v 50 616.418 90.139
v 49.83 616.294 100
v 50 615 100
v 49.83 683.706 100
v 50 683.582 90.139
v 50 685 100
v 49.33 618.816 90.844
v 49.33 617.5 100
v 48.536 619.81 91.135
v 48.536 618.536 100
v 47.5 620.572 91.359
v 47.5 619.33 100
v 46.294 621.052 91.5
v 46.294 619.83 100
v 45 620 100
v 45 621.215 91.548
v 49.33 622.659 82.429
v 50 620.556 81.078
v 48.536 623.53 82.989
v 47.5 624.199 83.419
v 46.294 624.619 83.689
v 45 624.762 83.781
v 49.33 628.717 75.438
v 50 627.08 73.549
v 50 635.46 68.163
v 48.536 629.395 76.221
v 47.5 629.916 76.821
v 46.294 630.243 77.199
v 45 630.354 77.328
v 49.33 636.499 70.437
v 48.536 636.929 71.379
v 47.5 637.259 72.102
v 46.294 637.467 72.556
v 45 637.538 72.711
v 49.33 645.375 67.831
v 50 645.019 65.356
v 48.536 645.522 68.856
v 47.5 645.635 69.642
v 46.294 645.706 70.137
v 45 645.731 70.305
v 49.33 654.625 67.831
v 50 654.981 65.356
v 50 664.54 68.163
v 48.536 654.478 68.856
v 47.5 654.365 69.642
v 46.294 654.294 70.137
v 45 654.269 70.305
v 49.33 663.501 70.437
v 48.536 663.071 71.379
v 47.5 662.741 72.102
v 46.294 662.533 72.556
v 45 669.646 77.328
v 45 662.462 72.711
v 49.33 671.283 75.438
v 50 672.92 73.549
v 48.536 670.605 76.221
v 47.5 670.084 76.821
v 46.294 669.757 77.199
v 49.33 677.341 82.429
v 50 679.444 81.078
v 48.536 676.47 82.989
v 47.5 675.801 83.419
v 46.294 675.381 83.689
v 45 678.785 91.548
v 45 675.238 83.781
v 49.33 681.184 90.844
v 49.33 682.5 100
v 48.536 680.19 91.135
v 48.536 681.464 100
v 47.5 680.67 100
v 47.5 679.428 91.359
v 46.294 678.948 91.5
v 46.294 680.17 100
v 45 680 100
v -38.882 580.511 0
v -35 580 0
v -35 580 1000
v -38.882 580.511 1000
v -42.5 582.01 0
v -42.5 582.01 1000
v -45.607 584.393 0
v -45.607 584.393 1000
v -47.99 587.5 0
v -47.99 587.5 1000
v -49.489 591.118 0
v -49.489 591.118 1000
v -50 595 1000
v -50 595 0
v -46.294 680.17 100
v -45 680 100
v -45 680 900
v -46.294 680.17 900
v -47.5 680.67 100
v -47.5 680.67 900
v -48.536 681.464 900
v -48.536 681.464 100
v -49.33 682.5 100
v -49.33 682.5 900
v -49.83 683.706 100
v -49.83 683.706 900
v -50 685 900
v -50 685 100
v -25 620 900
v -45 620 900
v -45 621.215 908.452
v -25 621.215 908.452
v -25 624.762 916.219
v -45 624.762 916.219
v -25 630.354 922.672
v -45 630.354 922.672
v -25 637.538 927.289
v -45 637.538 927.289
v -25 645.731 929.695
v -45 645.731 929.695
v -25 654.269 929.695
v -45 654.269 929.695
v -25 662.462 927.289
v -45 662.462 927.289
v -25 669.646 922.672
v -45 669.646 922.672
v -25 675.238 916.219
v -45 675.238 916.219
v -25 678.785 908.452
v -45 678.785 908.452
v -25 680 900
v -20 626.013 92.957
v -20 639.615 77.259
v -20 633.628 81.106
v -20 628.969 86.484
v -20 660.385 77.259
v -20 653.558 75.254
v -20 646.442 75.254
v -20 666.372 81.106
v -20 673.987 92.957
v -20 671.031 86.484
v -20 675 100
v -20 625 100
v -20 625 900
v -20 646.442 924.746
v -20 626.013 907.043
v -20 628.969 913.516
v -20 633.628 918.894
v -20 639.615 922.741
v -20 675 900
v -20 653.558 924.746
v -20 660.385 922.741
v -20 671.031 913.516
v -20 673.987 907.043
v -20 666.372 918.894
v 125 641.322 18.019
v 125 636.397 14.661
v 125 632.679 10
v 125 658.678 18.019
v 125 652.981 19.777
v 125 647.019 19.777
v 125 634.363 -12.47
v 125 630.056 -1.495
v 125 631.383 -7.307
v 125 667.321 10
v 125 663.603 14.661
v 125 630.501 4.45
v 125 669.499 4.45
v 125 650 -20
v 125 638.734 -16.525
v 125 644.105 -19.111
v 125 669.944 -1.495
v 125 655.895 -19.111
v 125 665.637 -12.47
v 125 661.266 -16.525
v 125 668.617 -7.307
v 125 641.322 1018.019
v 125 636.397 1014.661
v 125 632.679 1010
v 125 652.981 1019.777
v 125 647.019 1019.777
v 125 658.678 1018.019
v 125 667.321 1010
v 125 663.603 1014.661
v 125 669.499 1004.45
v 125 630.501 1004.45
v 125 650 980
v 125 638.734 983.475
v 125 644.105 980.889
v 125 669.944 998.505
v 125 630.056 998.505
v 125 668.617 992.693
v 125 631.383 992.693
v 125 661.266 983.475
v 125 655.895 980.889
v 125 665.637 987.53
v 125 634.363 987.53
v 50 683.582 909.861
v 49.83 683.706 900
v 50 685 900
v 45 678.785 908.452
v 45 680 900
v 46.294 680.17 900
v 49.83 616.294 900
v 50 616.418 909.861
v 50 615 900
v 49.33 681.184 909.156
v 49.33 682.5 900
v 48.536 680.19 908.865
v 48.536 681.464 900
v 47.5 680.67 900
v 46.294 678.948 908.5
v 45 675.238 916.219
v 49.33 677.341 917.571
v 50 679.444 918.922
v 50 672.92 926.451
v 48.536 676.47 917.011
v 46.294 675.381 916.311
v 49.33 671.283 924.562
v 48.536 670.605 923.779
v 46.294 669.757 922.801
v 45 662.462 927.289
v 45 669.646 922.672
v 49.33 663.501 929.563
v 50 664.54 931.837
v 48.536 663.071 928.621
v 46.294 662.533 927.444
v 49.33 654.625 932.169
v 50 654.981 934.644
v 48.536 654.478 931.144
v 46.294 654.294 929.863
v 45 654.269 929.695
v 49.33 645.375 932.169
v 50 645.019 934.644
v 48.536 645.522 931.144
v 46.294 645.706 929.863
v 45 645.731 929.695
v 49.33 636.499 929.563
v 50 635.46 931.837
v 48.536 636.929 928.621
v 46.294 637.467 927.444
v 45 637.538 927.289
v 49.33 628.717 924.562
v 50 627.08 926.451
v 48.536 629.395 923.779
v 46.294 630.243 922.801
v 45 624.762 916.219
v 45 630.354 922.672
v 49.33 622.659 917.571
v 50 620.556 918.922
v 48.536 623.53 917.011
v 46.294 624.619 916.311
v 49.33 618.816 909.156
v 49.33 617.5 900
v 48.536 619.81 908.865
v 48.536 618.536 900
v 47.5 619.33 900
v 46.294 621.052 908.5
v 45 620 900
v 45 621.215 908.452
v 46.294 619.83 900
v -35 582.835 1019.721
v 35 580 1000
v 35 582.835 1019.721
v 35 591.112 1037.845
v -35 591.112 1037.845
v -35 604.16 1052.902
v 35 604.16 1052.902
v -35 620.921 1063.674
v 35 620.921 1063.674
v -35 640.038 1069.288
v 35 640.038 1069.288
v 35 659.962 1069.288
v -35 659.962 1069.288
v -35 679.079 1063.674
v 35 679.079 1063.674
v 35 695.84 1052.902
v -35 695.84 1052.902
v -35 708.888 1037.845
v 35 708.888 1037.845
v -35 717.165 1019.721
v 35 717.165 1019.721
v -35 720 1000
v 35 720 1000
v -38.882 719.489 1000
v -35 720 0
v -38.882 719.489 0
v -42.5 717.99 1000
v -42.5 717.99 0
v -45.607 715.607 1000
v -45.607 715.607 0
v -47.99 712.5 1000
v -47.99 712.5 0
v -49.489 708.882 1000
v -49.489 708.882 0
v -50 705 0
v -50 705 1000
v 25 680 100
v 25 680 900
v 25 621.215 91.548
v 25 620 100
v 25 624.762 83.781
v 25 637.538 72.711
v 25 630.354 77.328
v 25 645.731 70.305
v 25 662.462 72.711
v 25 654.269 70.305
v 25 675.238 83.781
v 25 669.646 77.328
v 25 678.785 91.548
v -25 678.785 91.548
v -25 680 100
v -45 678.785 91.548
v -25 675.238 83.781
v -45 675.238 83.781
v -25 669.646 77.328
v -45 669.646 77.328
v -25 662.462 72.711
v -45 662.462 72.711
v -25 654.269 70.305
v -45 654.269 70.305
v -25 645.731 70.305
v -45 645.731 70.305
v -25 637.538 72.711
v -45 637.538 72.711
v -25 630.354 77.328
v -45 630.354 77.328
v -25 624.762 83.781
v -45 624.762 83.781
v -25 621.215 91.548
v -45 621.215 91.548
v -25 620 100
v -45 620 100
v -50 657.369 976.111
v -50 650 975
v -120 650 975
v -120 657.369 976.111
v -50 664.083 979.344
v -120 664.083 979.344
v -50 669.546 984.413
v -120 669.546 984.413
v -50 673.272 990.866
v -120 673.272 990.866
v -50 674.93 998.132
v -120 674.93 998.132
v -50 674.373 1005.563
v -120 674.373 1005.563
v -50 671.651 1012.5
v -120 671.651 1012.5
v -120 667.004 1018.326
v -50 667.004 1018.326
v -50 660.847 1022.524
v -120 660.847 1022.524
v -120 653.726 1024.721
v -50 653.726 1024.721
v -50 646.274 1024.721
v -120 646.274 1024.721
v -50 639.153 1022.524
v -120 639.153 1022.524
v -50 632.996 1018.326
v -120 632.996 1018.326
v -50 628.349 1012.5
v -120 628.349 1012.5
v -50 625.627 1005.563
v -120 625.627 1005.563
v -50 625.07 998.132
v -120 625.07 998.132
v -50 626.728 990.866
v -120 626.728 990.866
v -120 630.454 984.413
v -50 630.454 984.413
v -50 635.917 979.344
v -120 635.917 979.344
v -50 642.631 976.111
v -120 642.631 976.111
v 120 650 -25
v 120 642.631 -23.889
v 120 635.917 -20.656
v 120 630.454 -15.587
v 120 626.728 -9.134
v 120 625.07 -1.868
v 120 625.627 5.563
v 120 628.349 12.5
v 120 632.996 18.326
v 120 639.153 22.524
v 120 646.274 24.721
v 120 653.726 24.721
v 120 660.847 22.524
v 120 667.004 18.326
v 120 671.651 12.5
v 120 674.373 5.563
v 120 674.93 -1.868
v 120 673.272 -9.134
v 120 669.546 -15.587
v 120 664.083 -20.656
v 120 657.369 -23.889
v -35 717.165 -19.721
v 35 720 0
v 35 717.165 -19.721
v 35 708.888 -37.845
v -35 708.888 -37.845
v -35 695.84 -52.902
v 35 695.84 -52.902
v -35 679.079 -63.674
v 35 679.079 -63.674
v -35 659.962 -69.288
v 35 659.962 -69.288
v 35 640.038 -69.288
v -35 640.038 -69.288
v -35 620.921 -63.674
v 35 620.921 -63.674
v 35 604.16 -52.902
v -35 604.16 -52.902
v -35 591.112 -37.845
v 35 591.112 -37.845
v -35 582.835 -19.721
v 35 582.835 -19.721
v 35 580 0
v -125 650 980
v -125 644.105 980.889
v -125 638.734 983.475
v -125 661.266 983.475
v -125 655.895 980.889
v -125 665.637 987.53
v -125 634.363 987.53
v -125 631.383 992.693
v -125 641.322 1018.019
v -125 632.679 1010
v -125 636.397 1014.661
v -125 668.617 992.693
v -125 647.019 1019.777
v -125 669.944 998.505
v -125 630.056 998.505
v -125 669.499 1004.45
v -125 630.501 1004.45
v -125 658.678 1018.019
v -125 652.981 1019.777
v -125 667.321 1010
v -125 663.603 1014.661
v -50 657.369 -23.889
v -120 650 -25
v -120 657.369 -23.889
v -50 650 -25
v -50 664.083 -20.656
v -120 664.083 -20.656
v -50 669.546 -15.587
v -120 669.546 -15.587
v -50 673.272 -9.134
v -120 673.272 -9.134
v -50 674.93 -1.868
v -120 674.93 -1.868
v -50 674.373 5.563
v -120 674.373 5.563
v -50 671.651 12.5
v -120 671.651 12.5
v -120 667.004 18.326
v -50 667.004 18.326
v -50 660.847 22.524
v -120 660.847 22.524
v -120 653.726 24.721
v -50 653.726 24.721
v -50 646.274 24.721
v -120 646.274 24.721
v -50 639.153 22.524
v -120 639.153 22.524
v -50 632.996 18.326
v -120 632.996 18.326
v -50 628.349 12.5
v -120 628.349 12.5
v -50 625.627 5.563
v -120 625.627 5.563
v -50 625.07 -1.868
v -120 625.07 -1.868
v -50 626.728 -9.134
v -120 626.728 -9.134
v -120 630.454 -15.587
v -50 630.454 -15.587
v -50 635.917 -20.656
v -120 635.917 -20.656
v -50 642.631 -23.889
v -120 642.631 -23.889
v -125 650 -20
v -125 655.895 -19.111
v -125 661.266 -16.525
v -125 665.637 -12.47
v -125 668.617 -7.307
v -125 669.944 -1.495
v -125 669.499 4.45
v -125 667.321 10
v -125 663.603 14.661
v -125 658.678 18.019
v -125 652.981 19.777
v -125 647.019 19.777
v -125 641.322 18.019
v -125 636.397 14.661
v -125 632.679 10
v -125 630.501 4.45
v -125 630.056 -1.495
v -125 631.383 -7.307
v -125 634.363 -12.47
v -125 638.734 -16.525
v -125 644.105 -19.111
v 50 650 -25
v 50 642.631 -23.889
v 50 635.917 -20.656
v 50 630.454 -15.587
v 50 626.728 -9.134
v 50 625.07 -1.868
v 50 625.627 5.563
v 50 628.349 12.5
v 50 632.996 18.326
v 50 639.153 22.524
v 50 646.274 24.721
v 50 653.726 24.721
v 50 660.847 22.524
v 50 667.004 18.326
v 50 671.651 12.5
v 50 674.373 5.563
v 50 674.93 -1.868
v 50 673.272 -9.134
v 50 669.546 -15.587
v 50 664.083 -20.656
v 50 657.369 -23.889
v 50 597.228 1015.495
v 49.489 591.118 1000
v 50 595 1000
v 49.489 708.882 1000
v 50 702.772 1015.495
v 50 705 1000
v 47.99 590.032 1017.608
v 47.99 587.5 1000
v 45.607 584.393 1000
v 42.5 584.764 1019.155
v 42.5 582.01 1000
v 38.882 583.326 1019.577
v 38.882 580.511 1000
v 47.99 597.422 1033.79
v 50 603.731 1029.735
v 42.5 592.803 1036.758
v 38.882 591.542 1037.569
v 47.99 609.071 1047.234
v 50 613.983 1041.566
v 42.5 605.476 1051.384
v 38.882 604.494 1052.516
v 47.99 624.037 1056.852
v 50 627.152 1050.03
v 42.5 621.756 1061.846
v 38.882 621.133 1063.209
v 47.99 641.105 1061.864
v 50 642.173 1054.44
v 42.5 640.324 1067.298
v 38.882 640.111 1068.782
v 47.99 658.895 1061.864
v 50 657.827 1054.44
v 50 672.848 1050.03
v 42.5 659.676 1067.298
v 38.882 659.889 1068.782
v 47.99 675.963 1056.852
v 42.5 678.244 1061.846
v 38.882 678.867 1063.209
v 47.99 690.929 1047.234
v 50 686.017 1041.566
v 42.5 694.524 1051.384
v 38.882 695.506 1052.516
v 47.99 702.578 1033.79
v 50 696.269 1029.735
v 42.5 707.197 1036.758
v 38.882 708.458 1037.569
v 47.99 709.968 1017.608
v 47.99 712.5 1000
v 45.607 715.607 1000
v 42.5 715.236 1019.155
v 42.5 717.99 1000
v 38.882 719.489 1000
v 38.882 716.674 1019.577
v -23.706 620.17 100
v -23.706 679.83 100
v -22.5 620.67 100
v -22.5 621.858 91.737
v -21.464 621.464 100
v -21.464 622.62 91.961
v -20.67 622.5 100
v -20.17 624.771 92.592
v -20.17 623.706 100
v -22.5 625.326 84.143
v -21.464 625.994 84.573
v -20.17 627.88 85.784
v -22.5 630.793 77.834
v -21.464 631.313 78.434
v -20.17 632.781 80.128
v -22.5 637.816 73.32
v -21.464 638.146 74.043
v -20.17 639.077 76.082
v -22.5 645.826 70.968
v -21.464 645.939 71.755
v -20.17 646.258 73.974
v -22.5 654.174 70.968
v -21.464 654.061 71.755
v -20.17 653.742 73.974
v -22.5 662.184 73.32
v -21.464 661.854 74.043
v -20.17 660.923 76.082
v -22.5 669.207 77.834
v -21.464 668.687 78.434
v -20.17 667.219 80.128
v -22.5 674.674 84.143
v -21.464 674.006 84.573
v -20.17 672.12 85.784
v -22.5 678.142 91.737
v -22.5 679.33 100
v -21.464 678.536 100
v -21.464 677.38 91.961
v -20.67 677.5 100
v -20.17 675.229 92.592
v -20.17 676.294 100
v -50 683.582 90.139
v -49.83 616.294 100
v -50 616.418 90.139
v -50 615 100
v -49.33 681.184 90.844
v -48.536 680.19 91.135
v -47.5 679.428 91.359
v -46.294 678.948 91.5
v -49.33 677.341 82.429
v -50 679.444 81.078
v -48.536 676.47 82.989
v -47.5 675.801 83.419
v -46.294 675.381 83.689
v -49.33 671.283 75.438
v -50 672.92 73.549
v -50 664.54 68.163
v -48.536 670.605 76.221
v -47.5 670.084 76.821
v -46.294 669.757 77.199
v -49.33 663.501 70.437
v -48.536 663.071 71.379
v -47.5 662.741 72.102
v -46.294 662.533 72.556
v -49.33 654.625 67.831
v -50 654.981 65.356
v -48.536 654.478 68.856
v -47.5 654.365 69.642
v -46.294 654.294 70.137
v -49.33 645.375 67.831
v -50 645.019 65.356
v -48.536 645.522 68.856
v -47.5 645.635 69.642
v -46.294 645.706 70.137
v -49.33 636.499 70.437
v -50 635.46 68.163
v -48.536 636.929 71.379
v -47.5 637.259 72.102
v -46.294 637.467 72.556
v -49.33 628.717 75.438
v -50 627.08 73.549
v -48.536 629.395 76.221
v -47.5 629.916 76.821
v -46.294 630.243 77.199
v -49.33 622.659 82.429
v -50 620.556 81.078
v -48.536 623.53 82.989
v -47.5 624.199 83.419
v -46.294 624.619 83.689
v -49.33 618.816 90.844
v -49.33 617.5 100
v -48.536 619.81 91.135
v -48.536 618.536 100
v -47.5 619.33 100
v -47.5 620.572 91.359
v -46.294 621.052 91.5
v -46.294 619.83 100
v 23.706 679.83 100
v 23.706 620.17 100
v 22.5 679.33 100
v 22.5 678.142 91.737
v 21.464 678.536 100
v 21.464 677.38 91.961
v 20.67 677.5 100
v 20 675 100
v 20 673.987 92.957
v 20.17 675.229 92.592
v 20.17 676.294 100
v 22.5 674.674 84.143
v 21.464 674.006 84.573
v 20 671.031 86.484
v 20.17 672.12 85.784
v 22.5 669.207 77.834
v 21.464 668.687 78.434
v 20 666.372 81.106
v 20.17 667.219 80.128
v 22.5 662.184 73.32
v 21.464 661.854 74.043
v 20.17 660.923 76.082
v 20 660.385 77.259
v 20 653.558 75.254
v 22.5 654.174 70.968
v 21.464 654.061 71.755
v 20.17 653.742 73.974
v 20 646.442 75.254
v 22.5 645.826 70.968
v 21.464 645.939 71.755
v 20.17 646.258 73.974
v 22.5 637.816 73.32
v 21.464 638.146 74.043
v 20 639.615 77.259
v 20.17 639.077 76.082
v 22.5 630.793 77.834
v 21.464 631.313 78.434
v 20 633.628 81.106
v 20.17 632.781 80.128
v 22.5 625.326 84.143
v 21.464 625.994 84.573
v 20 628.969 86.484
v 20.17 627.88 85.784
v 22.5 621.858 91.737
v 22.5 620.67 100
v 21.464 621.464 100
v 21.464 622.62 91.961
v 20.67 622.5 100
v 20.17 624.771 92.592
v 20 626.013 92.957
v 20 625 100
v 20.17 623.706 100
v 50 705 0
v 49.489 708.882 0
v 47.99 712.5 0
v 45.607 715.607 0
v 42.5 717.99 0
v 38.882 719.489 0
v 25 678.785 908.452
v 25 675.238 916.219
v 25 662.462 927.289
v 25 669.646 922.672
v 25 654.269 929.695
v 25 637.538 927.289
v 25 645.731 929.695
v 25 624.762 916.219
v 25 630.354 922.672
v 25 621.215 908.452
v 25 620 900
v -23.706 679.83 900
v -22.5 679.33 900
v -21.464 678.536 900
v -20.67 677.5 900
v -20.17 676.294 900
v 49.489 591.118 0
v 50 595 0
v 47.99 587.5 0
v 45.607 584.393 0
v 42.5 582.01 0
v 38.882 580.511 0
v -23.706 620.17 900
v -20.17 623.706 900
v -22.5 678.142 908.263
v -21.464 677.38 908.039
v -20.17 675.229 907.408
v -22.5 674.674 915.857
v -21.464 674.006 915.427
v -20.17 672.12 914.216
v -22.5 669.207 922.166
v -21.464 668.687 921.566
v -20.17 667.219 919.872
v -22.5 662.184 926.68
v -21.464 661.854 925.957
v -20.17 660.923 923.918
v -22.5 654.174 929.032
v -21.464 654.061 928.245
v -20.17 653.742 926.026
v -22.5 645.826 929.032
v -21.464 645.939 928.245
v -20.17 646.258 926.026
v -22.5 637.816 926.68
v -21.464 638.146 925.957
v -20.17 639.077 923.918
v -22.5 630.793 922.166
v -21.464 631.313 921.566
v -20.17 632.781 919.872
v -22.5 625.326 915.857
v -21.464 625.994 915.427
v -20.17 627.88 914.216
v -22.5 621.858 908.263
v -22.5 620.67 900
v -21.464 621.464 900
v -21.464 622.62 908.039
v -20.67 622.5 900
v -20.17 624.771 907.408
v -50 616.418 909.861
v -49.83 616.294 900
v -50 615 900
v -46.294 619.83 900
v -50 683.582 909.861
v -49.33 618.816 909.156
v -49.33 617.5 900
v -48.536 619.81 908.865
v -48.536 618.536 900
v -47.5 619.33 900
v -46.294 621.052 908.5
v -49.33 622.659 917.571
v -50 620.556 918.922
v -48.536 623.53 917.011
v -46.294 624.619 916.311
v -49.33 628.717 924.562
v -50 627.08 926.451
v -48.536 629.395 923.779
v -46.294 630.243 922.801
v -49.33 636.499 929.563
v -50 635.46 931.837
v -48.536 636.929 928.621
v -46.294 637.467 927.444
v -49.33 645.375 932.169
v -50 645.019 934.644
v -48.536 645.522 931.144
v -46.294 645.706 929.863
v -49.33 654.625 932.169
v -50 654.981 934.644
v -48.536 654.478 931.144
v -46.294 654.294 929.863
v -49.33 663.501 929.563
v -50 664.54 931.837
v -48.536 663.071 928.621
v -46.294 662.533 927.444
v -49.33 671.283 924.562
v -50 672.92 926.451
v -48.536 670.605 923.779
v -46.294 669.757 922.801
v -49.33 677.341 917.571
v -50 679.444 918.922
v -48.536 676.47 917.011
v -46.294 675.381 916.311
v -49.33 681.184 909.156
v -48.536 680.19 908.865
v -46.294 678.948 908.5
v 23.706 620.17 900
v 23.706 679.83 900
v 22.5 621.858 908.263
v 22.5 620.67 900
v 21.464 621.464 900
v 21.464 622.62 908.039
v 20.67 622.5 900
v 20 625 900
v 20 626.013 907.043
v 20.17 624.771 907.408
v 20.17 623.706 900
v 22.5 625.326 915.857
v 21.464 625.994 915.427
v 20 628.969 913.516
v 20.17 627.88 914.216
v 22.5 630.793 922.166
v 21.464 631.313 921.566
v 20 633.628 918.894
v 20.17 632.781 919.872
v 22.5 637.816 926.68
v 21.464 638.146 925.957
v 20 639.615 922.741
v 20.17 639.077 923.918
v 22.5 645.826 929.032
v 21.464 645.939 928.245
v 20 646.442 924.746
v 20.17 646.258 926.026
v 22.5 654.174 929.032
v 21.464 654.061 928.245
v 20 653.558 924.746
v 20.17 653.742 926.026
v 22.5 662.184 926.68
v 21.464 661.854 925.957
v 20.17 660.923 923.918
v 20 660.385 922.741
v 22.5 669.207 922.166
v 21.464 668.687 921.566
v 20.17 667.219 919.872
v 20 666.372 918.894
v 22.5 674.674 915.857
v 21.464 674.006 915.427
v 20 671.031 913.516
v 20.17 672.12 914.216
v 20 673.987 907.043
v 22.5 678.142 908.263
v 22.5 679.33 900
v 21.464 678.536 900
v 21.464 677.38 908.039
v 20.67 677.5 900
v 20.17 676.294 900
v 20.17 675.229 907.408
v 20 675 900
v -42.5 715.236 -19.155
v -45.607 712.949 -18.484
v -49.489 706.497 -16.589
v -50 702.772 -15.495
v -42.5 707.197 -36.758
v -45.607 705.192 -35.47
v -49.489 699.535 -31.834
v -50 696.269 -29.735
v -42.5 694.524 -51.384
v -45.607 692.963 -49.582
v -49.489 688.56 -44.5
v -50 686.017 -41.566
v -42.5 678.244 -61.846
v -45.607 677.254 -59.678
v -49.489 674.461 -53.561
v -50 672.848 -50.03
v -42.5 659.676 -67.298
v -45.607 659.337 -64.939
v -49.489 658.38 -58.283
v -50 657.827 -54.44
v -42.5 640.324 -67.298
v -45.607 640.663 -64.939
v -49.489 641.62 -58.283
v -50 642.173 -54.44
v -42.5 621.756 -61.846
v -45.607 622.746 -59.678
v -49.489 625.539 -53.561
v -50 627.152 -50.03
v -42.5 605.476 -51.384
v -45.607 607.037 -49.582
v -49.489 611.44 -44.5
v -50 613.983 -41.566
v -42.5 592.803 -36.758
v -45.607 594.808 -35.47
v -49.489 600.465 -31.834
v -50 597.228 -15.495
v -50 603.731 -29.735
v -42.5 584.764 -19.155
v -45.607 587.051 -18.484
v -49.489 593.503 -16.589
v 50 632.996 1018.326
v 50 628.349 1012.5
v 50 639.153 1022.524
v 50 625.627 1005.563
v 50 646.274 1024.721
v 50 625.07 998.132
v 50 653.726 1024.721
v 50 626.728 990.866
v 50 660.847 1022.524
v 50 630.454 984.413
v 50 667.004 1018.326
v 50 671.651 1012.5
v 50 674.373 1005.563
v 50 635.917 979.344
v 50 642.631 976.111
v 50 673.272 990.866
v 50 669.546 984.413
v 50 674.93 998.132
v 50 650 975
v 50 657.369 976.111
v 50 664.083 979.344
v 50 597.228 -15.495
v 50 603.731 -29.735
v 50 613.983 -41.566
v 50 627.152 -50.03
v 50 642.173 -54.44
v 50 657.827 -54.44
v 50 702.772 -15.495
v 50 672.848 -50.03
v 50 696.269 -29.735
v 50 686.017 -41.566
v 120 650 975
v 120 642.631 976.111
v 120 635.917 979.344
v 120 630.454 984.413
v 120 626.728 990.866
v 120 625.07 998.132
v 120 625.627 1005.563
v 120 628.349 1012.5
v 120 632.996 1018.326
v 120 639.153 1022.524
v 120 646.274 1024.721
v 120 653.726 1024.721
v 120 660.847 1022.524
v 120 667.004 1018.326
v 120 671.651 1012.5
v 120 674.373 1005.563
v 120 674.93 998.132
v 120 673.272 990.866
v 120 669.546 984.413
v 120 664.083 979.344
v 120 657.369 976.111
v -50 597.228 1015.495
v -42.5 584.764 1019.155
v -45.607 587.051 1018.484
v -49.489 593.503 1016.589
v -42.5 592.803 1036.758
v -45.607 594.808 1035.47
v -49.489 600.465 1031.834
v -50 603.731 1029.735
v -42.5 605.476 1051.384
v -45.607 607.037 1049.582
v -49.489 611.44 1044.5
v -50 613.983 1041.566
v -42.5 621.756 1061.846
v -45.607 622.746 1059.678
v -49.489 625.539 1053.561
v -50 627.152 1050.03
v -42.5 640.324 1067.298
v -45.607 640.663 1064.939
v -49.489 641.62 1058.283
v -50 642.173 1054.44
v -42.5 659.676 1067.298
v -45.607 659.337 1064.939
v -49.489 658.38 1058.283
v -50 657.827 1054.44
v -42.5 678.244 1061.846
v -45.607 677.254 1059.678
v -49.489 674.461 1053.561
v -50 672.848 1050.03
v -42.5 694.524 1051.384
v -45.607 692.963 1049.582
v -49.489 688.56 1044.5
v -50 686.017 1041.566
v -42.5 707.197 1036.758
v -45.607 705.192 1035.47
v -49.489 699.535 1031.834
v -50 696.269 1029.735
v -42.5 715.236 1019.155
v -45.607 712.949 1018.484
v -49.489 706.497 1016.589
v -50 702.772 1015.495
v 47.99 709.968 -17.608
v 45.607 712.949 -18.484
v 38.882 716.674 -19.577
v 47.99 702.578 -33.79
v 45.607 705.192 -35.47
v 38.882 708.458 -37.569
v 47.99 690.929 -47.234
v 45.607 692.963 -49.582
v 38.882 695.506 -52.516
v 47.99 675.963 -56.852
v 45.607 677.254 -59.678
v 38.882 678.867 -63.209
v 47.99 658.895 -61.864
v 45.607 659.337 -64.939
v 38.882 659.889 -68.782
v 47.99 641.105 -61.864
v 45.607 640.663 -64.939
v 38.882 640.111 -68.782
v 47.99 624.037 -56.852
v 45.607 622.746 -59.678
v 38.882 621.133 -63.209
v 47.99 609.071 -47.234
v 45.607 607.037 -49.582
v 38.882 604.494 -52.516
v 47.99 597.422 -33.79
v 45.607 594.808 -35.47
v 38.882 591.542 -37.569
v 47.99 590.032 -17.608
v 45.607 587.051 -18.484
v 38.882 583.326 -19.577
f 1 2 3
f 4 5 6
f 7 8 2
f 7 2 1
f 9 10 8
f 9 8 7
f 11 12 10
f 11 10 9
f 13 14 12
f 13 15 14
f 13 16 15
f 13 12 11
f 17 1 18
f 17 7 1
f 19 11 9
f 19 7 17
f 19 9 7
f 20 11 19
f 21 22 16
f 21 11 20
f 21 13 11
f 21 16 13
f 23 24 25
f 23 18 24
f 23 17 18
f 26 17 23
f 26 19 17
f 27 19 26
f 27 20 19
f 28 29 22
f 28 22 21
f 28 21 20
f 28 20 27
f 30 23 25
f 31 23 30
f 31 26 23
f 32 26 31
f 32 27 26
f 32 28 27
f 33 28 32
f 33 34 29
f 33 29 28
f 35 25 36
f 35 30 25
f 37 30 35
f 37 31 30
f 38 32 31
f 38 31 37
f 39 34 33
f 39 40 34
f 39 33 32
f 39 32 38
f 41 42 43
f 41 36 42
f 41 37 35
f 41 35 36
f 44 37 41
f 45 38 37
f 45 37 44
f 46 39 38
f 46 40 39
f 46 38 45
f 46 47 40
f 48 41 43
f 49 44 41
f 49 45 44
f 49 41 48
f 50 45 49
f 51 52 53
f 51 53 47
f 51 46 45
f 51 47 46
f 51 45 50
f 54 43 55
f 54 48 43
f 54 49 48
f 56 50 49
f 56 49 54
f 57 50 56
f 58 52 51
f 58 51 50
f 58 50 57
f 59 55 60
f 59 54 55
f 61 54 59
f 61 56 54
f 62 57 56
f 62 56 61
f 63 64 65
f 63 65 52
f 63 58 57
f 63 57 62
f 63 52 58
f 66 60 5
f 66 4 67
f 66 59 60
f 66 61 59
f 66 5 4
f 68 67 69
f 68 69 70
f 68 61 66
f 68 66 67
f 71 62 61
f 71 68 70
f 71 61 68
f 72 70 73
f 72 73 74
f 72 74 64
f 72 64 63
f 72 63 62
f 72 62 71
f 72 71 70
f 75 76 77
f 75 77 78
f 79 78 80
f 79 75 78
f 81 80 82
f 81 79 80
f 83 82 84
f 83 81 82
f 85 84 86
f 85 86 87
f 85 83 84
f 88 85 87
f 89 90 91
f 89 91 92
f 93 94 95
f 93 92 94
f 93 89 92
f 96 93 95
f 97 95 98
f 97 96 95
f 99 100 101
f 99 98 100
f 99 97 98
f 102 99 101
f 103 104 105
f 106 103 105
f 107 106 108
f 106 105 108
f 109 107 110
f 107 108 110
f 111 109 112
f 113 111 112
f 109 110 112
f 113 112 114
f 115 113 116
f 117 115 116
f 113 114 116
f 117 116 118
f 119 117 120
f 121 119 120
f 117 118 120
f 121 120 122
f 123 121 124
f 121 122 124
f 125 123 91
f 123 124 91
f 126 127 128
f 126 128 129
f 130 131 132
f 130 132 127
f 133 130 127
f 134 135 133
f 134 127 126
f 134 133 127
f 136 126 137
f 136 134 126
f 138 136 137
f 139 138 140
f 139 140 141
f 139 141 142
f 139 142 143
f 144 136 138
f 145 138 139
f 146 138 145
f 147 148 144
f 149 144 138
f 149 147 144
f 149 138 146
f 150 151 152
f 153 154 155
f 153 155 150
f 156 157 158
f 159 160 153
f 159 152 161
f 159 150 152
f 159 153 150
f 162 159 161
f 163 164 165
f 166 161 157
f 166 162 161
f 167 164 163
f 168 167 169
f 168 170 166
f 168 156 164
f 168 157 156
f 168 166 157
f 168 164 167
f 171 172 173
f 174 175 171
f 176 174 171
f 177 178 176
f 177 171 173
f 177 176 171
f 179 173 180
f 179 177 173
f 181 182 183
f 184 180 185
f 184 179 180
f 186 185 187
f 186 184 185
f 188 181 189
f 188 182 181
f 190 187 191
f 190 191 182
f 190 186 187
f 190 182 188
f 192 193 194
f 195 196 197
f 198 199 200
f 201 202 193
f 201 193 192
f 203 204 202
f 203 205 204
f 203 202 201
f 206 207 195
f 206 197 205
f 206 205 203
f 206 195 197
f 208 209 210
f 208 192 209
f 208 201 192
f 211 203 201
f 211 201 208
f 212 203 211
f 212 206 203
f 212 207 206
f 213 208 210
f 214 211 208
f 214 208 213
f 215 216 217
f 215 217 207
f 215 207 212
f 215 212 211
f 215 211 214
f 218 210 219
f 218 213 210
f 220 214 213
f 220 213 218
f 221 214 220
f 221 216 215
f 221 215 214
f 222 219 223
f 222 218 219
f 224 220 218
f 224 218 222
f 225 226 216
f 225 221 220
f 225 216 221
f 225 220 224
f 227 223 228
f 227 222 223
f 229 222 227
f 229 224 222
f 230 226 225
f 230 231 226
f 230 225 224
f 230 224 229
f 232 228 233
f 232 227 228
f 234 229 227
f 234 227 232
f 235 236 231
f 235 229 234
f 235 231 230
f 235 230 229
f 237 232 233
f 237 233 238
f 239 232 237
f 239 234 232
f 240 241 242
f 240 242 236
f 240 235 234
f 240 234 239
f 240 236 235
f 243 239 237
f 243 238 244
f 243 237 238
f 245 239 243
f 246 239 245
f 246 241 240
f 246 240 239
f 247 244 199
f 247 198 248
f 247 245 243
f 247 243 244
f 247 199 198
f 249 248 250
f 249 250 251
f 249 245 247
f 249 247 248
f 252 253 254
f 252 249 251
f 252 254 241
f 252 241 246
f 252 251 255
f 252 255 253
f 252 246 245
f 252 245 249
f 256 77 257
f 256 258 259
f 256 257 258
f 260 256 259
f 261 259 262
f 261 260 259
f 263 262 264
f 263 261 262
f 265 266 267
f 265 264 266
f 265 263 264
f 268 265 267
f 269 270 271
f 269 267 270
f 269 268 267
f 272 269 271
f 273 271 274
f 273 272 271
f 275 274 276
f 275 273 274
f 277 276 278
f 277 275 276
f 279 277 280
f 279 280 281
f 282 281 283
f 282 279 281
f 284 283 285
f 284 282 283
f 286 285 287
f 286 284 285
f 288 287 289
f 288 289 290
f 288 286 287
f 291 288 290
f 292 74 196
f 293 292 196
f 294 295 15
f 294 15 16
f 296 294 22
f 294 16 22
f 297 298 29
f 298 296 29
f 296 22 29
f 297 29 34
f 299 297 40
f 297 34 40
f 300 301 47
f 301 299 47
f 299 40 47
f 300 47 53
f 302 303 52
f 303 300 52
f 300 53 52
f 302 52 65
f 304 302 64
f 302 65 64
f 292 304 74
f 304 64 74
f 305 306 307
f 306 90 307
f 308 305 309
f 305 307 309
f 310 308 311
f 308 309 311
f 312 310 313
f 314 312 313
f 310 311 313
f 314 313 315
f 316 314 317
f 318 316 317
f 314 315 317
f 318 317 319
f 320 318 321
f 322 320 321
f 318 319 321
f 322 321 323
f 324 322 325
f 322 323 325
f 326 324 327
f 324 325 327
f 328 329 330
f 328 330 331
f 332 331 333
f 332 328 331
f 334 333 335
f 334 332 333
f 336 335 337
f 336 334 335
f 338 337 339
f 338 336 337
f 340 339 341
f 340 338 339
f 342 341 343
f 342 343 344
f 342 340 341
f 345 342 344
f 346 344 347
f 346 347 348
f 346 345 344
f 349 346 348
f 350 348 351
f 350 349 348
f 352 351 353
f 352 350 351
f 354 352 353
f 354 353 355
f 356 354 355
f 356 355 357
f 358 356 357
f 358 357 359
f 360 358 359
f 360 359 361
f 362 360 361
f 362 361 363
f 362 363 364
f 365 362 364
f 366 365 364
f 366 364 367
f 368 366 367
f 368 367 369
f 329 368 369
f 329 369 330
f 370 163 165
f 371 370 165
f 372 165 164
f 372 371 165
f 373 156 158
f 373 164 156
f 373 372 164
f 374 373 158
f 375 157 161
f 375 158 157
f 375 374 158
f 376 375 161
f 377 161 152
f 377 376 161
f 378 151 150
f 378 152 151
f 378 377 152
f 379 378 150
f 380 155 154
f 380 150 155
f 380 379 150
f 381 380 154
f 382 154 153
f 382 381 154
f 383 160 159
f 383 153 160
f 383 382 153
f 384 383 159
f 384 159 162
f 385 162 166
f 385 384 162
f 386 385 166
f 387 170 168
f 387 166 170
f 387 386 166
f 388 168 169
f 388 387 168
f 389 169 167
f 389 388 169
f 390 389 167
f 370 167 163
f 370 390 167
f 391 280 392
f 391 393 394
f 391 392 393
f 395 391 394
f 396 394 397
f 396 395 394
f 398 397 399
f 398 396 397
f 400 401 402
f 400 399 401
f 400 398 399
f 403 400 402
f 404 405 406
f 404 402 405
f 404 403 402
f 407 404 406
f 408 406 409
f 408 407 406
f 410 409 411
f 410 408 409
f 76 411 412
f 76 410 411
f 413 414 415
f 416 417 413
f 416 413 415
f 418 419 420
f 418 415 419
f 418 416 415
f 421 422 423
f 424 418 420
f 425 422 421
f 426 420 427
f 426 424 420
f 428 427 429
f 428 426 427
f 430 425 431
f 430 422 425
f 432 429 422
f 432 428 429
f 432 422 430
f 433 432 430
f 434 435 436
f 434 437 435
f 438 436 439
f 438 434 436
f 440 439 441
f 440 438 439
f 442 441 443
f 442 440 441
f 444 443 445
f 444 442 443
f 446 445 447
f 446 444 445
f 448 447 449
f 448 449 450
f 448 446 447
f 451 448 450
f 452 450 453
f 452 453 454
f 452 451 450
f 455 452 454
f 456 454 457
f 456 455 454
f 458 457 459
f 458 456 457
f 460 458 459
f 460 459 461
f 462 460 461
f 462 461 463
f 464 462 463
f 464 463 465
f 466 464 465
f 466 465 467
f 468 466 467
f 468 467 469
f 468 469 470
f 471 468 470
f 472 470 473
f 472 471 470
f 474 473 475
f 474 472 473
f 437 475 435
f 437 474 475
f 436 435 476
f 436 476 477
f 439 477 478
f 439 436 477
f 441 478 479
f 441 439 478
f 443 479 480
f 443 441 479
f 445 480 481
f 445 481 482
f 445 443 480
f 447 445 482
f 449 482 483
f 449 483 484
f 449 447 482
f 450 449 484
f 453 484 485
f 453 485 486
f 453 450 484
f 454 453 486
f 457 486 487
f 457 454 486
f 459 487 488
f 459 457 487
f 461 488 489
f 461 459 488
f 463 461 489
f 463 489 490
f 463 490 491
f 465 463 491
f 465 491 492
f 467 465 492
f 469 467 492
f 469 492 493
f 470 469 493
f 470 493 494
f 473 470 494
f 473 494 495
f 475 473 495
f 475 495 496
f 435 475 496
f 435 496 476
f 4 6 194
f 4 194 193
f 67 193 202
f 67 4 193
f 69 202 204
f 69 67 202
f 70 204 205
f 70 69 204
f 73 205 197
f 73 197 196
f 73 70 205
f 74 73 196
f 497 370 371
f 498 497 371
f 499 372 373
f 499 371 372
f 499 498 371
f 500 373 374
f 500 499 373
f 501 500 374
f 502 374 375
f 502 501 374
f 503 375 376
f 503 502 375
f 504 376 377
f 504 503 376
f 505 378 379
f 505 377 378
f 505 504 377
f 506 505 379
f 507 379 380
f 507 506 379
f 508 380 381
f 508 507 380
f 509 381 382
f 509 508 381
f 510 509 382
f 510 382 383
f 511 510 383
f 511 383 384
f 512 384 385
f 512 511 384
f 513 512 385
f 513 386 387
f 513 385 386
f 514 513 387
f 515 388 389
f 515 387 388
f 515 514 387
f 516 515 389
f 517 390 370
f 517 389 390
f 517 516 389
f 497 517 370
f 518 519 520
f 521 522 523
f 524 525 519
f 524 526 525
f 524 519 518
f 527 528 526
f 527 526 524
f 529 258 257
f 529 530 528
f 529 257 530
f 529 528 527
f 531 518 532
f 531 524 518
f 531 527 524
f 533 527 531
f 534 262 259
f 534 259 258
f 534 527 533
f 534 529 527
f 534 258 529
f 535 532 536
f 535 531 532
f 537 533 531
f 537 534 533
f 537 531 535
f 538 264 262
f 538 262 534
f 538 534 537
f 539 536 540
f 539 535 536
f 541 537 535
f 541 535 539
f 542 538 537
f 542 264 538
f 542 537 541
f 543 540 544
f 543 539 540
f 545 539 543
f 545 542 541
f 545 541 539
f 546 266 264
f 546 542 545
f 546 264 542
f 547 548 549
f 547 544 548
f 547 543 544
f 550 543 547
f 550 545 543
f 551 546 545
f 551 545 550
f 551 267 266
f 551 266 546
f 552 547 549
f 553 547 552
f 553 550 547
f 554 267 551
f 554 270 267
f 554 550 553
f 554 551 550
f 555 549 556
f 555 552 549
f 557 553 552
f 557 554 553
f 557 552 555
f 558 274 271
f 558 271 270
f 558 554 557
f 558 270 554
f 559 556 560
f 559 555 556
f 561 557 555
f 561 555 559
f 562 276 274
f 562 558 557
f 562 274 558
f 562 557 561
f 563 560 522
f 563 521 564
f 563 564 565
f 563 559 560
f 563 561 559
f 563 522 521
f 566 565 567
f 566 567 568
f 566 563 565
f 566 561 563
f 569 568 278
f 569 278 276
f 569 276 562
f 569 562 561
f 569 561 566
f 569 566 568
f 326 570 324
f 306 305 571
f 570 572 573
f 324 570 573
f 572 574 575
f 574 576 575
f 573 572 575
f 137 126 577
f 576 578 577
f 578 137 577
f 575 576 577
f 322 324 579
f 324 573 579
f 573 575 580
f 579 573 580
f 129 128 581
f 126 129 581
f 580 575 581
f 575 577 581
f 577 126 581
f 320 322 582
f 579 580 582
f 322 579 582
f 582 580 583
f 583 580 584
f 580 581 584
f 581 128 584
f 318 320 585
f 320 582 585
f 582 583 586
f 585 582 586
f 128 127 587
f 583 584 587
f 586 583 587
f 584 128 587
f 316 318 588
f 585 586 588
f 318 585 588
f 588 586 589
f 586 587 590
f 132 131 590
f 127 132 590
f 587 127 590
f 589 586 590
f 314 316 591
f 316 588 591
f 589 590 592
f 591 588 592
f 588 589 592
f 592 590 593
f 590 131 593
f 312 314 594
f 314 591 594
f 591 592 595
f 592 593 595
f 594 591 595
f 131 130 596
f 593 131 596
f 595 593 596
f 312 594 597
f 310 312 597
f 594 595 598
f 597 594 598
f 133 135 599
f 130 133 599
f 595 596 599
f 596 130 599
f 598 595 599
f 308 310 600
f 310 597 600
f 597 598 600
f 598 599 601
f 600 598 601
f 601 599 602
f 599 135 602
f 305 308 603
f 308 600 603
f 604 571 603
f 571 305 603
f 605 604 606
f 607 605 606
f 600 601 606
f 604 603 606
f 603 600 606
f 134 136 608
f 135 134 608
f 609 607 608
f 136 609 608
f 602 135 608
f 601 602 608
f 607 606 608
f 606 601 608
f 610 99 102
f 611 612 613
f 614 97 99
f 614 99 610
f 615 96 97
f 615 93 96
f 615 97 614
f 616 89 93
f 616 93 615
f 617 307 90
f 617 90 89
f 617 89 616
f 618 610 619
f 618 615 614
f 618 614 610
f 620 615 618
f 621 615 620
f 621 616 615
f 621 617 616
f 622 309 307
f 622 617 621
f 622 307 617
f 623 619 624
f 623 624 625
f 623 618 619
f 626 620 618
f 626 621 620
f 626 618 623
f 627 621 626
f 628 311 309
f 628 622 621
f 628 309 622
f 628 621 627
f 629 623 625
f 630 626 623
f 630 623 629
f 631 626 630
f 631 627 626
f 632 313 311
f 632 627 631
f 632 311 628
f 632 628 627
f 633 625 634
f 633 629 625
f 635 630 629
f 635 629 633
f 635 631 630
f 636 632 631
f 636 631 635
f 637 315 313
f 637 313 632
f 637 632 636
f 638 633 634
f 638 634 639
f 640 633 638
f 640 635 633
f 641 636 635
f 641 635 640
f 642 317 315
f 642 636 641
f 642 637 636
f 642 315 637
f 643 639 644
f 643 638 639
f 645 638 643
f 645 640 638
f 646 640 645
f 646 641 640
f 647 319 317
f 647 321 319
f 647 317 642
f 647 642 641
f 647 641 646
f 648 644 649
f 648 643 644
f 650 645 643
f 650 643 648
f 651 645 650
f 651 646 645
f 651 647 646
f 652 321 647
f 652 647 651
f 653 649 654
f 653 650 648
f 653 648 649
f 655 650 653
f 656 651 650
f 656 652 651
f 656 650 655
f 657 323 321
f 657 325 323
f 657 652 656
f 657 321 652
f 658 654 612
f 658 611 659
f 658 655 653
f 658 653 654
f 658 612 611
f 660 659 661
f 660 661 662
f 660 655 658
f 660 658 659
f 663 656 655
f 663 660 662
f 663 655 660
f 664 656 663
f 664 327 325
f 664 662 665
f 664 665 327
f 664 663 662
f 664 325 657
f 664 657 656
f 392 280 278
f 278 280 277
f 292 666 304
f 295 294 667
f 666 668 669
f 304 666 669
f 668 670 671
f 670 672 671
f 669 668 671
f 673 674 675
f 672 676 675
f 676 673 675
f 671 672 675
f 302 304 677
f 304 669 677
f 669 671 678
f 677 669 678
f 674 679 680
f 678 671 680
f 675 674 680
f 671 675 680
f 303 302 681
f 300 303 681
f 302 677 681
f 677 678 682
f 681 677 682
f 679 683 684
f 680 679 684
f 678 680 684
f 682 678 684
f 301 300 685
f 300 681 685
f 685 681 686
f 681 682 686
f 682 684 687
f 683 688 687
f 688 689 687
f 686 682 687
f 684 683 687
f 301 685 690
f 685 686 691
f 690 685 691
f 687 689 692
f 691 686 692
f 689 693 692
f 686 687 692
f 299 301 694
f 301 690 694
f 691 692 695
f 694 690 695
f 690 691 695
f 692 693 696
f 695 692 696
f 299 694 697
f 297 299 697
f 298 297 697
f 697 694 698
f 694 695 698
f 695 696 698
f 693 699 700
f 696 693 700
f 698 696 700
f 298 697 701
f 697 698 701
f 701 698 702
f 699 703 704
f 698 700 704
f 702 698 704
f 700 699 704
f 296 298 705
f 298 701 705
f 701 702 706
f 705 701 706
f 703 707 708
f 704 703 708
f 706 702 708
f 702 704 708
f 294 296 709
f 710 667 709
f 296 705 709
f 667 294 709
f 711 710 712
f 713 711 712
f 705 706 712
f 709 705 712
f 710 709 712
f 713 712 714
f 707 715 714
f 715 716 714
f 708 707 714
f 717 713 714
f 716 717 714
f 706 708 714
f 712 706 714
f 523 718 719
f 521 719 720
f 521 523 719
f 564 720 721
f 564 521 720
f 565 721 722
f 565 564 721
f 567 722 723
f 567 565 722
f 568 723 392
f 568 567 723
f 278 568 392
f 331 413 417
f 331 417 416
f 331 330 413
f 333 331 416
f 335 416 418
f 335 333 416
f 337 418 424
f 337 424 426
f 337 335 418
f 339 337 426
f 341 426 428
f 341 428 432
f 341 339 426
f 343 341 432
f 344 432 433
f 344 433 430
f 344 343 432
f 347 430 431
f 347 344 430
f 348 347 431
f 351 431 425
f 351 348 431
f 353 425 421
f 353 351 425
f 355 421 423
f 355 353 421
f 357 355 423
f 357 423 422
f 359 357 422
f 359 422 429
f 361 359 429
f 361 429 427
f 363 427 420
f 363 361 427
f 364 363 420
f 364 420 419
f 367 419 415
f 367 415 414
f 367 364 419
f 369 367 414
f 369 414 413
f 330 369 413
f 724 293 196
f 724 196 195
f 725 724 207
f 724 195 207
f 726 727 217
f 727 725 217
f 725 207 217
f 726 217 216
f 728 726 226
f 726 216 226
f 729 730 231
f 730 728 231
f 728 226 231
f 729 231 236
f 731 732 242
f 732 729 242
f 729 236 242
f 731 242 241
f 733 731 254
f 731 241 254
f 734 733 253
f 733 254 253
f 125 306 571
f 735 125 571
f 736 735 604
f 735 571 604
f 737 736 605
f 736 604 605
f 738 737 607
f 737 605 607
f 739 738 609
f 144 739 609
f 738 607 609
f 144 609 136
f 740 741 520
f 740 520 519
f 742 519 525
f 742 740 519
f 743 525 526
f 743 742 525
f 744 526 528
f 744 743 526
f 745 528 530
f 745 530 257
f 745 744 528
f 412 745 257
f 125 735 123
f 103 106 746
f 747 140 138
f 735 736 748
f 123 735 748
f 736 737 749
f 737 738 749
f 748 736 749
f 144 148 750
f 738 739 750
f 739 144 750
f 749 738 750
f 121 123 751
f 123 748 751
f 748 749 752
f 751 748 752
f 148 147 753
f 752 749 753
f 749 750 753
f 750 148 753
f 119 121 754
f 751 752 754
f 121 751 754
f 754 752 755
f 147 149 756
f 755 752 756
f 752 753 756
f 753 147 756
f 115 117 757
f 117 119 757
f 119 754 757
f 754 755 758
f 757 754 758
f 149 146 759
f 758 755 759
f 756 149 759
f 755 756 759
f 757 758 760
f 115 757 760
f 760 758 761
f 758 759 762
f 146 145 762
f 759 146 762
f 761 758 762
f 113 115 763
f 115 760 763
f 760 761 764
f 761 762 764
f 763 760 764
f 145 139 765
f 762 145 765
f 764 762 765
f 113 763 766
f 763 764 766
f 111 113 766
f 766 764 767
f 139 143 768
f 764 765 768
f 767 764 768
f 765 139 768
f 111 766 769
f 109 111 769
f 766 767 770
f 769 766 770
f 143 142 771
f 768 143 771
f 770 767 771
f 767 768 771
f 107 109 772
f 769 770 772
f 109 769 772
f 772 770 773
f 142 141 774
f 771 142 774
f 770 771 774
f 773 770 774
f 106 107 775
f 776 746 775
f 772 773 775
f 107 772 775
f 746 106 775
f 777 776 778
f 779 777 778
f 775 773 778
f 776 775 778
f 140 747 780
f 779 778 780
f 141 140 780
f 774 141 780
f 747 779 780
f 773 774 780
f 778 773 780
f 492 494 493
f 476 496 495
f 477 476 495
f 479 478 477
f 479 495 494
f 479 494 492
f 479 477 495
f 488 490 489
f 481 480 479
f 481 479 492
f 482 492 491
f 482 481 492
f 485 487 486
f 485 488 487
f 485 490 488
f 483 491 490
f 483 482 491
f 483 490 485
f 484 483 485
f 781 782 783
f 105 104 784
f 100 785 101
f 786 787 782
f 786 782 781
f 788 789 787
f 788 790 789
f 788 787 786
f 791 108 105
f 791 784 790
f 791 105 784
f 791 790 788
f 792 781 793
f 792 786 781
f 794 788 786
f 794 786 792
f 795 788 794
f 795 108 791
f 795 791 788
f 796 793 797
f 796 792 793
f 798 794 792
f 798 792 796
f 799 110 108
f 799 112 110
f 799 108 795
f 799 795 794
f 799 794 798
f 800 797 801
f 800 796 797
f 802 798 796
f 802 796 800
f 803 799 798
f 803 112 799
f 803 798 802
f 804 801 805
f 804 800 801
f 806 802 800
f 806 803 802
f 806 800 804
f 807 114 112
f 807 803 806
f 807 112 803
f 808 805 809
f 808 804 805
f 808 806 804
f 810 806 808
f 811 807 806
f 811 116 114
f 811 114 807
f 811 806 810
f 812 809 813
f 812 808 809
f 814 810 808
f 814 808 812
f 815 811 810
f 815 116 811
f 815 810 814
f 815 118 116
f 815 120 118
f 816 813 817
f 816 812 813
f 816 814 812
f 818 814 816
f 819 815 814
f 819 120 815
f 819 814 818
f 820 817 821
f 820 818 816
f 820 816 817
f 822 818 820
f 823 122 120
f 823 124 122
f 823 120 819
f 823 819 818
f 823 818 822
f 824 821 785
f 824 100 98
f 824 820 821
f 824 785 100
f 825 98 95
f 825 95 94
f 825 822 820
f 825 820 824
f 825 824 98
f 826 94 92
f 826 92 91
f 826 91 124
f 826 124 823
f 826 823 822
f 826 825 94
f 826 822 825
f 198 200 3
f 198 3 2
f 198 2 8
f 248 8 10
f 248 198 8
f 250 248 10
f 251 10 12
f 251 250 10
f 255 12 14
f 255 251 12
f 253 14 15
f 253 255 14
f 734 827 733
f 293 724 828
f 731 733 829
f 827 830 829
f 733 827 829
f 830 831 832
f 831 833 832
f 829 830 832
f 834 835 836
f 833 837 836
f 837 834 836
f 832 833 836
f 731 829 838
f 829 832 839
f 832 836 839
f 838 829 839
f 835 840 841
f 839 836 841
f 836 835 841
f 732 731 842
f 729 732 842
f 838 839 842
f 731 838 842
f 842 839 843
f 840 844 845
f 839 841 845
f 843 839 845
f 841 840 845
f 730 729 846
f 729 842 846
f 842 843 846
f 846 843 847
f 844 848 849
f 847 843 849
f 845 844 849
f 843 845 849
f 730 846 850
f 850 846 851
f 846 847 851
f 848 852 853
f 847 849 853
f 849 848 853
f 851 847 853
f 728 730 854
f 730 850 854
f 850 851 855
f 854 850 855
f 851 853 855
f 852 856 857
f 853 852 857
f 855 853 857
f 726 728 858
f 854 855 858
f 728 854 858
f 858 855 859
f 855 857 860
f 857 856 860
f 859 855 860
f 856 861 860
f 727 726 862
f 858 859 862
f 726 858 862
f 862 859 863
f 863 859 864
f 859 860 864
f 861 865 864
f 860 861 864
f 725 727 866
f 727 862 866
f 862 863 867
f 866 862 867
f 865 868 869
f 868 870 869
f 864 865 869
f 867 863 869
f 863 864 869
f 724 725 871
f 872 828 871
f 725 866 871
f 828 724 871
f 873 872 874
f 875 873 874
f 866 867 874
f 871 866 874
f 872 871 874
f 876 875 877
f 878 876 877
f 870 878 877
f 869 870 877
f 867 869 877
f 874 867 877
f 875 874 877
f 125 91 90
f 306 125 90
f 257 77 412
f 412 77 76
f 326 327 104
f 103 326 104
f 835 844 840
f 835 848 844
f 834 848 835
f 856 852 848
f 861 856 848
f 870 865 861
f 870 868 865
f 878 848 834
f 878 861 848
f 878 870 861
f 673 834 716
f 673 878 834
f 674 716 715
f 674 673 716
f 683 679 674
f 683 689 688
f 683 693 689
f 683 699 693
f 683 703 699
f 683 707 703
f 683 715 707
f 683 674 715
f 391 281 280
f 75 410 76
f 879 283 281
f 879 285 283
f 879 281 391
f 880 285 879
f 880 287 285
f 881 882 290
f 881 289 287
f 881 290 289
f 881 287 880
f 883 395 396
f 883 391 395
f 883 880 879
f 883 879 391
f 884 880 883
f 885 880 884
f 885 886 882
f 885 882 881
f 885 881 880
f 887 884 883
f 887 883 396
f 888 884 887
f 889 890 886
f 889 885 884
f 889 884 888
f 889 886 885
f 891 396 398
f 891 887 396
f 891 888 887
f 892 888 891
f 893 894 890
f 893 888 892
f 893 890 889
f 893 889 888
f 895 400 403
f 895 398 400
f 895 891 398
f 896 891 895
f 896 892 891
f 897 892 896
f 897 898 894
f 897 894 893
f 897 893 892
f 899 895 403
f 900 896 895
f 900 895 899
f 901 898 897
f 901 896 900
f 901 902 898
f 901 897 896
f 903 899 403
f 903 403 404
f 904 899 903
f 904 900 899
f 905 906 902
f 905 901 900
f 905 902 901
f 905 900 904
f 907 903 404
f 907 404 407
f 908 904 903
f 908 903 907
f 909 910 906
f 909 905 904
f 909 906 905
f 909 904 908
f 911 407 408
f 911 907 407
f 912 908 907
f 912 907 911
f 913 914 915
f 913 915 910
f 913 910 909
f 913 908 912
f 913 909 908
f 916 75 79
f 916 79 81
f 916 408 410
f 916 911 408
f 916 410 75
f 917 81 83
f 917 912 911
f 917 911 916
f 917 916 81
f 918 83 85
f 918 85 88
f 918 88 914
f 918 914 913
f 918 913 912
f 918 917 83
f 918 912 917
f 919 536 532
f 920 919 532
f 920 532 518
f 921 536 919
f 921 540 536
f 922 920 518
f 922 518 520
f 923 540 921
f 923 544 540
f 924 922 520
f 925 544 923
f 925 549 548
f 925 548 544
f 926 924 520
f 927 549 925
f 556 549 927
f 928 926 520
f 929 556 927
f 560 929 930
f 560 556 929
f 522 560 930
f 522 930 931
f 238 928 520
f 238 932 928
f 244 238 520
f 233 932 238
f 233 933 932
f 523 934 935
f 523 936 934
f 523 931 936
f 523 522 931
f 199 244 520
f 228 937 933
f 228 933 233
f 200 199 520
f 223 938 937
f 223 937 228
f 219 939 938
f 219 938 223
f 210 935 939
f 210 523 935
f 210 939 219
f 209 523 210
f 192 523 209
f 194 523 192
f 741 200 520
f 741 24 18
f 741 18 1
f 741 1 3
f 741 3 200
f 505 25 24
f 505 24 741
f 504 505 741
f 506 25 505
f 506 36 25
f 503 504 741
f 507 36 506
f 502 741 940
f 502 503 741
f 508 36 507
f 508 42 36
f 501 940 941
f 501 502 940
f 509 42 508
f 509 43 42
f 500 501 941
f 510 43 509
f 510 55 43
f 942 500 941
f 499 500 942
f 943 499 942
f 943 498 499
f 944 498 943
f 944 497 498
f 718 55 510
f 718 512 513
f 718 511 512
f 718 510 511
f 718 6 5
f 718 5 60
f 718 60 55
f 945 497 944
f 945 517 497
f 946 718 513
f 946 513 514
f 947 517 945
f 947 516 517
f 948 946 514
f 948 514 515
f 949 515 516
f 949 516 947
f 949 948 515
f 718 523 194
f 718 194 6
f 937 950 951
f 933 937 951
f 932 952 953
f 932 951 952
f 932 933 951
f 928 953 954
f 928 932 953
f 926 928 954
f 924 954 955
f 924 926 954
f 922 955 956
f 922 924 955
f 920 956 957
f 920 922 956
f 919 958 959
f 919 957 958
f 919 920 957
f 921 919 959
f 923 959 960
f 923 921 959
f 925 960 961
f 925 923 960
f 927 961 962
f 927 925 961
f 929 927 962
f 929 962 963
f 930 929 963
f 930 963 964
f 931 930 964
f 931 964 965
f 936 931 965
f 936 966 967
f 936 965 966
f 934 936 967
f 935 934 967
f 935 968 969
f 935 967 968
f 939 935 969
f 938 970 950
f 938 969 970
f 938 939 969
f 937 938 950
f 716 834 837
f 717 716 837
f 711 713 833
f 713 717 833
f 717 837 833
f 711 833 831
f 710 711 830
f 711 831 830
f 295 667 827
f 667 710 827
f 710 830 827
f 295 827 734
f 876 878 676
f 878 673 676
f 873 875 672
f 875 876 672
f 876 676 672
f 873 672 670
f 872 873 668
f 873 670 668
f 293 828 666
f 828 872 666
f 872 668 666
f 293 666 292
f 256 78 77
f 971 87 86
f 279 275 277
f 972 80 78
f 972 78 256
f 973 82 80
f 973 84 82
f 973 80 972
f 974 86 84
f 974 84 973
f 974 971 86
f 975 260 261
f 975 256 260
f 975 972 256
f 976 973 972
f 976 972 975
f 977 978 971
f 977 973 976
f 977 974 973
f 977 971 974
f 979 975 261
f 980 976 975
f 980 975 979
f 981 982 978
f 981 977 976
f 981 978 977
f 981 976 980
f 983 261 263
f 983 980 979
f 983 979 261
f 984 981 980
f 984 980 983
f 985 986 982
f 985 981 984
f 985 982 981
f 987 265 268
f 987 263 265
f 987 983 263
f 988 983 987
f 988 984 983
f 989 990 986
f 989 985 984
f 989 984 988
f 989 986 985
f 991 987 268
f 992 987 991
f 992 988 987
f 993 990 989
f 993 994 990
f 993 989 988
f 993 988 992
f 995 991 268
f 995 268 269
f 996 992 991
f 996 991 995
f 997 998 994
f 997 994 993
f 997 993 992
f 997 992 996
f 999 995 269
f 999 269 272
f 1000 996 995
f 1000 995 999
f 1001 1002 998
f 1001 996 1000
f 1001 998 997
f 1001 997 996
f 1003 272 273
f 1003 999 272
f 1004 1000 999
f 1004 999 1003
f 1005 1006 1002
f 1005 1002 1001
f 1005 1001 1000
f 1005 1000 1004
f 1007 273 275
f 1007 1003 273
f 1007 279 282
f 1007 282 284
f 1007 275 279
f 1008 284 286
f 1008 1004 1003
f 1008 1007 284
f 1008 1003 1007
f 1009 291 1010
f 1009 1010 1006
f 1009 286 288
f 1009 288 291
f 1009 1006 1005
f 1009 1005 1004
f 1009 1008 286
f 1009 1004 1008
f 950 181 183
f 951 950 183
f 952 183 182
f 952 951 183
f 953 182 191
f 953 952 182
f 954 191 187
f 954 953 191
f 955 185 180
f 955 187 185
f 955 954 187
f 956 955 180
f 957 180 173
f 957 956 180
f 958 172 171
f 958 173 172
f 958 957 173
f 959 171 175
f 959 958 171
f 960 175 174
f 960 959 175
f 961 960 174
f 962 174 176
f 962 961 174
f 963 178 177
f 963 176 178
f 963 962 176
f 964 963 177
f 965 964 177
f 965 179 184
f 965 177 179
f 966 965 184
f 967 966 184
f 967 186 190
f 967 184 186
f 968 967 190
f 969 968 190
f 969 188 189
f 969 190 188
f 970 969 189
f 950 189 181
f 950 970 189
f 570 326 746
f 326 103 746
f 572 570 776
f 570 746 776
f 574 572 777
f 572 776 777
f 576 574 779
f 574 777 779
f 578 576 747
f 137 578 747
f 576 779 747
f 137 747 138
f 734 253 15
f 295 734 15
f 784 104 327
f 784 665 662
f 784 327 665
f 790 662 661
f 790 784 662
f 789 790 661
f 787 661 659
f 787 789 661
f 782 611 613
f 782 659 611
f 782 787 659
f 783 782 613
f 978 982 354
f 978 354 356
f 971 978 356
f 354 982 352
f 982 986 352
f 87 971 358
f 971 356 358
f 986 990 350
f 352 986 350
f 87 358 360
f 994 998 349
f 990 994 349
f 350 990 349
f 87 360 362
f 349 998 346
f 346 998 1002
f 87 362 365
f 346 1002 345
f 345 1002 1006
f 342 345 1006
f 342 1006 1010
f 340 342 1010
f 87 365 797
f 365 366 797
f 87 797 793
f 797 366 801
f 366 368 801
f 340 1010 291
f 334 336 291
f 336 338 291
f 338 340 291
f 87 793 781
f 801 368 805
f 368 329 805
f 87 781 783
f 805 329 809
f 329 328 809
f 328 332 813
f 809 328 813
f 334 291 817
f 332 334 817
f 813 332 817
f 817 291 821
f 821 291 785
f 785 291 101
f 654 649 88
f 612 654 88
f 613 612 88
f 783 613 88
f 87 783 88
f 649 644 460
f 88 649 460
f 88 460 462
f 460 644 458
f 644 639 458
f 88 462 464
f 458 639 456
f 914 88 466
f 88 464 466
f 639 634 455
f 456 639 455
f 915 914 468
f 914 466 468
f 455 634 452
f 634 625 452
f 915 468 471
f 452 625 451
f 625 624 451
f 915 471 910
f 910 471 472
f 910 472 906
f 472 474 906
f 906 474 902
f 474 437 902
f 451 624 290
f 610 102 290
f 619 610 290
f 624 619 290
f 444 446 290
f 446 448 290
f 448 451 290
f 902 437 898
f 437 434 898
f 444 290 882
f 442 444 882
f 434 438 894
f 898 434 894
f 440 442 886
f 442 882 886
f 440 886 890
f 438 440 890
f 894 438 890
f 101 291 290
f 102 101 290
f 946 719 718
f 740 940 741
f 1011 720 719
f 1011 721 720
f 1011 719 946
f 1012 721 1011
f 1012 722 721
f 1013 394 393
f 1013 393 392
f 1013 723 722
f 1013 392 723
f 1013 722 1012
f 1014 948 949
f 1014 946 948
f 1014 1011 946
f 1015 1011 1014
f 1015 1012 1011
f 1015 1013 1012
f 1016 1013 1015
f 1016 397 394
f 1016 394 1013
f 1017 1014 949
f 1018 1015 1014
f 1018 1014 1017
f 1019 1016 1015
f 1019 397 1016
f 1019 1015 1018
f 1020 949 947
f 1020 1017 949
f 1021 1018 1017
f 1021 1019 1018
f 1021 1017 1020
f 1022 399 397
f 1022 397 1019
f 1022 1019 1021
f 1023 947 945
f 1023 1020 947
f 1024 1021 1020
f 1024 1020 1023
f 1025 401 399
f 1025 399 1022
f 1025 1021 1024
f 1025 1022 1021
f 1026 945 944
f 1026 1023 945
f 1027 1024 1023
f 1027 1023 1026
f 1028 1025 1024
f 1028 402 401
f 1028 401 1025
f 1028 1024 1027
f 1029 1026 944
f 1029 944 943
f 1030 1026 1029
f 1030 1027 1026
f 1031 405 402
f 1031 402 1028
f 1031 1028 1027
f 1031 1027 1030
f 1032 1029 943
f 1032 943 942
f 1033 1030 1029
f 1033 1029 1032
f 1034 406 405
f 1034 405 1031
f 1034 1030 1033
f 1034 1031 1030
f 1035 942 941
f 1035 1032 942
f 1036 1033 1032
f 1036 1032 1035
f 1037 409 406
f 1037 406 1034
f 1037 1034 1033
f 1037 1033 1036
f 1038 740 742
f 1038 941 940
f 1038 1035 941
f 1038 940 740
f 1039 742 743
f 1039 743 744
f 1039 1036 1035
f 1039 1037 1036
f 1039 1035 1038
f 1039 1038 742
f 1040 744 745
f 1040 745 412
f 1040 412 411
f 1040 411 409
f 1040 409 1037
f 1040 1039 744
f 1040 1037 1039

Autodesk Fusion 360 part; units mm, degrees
sketch "Sketch3" plane through (0, 0, 0) normal (1, 0, 0) x (0, 0, -1)
  circle A0 centre (0, 650) radius 25
  line L0 (0, 720) -> (-1000, 720)
  arc A1 (-1000, 720) -> (-1000, 580) centre (-1000, 650) ccw
  line L1 (-1000, 580) -> (0, 580)
  arc A2 (0, 580) -> (0, 720) centre (0, 650) ccw
  line L2 (0, 650) -> (-1000, 650) construction
  arc A3 (75, 650) -> (-75, 650) centre (0, 650) ccw
  dimension "d1" = 1000
  dimension "d2" = 70
extrude "Extrude1" add sketch "Sketch3" along normal mid plane 100 contours A0 | L0 A1 L1 A2
sketch "Sketch1" plane through (50, 0, 0) normal (1, 0, 0) x (0, 0, -1)
  arc A0 (0, 580) -> (0, 720) centre (0, 650) ccw
  line L0 (0, 720) -> (-1000, 720)
  arc A1 (-1000, 720) -> (-1000, 580) centre (-1000, 650) ccw
  line L1 (-1000, 580) -> (0, 580)
  circle A2 centre (-1000, 650) radius 25
  circle A3 centre (0, 650) radius 25
  dimension "d39" = 50
  dimension "d40" = 50
extrude "Extrude2" add sketch "Sketch1" along normal blind 75 contours A2 | A3
mirror "Mirror1" about plane through (0, 0, 0) normal (1, 0, 0) of "Extrude2"
chamfer "Chamfer1" distance 5 angle 45 4 edges at (125, 640.9596, 1023.3082) (125, 640.9596, 23.3082) (-125, 640.9596, 1023.3082) (-125, 640.9596, 23.3082)
fillet "Fillet1" radius 15 8 edges at (50, 580, 500) (50, 650, -70) (50, 720, 500) (50, 650, 1070) (-50, 580, 500) (-50, 650, 1070) (-50, 720, 500) (-50, 650, -70)
sketch "Sketch2" plane through (-50, 0, 0) normal (-1, 0, 0) x (0, 0, 1)
  circle A0 centre (1000, 650) radius 25
  circle A1 centre (0, 650) radius 25
  line L0 (0, 595) -> (1000, 595)
  arc A2 (1000, 595) -> (1000, 705) centre (1000, 650) ccw
  line L1 (1000, 705) -> (0, 705)
  arc A3 (0, 705) -> (0, 595) centre (0, 650) ccw
  line L2 (100, 620) -> (900, 620)
  arc A4 (900, 620) -> (900, 680) centre (900, 650) ccw
  line L3 (900, 680) -> (100, 680)
  arc A5 (100, 680) -> (100, 620) centre (100, 650) ccw
  line L4 (100, 650) -> (900, 650) construction
  circle A6 centre (1000, 650) radius 20
  circle A7 centre (0, 650) radius 20
  dimension "d46" = 100
  dimension "d47" = 100
  dimension "d48" = 30
extrude "Extrude3" cut sketch "Sketch2" against normal blind 30 contours L2 A4 L3 A5
mirror "Mirror2" about plane through (0, 0, 0) normal (1, 0, 0) of "Extrude3"
fillet "Fillet2" radius 5 16 edges at (50, 680, 500) (50, 650, 70) (50, 620, 500) (50, 650, 930) (20, 680, 500) (20, 650, 930) (20, 620, 500) (20, 650, 70) (-20, 680, 500) (-20, 650, 930) (-20, 620, 500) (-20, 650, 70) (-50, 680, 500) (-50, 650, 930) (-50, 620, 500) (-50, 650, 70)
